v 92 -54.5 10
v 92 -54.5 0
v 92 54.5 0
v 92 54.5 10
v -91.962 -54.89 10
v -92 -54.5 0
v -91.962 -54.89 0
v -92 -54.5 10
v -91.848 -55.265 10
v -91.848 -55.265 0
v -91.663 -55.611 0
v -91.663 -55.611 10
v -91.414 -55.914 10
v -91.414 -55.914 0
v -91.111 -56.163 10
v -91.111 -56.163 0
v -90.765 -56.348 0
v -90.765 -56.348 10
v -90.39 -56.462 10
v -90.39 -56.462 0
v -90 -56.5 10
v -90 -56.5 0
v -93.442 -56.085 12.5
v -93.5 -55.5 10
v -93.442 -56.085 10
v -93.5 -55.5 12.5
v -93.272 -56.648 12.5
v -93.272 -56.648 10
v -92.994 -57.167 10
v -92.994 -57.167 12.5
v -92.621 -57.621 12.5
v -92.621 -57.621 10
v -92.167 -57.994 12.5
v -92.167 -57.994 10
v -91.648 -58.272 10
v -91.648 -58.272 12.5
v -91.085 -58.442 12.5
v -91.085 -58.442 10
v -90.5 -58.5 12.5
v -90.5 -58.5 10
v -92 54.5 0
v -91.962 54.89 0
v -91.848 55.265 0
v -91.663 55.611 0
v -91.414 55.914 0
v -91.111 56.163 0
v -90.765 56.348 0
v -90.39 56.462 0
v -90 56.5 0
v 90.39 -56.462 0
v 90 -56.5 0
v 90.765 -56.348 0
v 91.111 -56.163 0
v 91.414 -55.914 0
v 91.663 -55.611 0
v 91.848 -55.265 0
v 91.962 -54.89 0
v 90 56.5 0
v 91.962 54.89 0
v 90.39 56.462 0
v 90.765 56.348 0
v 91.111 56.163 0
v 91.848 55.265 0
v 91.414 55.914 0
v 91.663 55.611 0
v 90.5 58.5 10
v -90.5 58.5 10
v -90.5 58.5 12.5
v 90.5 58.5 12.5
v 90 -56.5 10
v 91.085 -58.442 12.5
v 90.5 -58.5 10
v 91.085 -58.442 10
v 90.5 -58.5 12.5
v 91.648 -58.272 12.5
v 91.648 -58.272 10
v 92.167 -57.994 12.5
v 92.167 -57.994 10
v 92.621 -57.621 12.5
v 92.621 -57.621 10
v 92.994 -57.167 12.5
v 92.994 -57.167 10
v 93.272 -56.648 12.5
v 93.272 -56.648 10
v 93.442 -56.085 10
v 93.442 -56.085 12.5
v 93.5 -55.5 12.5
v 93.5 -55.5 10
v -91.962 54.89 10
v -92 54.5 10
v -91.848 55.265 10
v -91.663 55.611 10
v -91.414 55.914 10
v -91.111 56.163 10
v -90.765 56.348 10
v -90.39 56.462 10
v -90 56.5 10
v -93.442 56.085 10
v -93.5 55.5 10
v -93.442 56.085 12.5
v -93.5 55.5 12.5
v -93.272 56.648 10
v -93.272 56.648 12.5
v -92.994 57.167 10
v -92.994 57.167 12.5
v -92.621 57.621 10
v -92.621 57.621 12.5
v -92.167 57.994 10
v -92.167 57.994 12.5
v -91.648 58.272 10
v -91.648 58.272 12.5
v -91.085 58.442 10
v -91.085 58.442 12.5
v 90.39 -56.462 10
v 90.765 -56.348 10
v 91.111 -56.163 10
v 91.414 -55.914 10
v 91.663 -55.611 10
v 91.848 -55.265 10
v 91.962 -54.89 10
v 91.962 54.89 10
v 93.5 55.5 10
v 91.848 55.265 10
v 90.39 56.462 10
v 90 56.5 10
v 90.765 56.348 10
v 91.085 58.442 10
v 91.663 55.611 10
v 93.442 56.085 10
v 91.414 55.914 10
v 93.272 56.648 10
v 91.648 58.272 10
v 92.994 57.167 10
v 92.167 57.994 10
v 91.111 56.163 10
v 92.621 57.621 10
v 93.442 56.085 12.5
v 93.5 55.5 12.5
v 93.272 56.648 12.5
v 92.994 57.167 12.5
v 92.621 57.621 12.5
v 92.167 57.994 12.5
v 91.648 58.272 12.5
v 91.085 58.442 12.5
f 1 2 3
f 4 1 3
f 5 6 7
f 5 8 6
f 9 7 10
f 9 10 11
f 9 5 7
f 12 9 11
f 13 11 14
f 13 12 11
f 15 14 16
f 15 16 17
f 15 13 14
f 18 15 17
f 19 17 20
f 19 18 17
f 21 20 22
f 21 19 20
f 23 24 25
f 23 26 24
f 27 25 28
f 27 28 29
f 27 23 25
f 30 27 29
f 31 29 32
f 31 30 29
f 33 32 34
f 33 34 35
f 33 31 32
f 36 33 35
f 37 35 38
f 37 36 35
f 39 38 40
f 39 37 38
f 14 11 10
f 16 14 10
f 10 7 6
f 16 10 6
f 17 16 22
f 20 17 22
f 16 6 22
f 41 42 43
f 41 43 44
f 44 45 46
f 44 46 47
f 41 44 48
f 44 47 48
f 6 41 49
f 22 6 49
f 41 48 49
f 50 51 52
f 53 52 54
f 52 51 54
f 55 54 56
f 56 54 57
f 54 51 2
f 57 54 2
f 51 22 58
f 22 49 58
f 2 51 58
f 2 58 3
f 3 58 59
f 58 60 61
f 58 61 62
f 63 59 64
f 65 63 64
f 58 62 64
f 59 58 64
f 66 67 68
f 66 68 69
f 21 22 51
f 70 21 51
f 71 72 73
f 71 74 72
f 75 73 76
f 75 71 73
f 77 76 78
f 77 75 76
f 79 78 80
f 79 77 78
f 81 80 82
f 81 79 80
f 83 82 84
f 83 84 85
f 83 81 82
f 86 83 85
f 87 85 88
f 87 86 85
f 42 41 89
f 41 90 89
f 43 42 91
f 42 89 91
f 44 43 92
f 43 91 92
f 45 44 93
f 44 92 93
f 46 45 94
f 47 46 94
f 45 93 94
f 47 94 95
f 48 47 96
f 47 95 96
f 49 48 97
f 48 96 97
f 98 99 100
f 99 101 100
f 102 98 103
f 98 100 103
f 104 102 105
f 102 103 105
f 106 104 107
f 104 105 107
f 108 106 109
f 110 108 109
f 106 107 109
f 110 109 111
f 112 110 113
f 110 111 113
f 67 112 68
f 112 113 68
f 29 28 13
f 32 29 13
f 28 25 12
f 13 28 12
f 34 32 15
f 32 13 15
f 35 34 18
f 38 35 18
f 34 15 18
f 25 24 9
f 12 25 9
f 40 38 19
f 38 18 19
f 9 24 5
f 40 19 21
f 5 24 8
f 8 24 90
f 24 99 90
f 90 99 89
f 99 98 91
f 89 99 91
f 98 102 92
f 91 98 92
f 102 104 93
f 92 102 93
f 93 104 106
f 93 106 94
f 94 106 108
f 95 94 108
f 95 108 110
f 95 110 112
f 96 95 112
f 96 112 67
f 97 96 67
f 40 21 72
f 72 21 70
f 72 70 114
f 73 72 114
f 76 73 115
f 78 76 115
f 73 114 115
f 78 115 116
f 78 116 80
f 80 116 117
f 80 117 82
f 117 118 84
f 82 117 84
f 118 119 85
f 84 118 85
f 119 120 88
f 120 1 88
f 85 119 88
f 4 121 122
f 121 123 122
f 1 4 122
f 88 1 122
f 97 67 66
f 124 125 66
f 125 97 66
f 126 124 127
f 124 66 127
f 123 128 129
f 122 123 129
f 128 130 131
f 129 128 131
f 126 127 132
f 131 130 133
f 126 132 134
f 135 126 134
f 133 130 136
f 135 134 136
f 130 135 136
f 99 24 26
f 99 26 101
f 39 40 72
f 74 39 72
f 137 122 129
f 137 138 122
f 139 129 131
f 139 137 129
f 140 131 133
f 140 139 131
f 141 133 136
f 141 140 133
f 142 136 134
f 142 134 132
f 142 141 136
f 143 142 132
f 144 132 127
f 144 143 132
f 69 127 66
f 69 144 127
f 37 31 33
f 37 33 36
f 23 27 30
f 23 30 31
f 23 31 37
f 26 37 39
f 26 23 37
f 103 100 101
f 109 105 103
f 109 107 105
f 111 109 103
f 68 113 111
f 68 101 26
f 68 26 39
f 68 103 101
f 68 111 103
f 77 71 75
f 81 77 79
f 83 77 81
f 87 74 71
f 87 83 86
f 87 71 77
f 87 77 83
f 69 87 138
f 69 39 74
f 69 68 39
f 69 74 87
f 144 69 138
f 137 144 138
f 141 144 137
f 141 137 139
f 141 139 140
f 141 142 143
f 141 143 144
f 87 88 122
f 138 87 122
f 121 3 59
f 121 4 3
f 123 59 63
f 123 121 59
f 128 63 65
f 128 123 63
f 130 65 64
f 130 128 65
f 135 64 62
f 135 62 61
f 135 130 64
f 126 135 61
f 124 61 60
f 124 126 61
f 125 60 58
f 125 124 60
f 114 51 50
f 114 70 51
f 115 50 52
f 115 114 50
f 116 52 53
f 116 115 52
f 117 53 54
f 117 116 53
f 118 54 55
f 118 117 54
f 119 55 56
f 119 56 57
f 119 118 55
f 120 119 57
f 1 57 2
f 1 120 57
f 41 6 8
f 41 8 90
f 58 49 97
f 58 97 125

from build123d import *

# Parameters (mm, degrees)
SCHIZZO1_W                   = 184
SCHIZZO1_H                   = 113
ESTRUSIONE_ESTRUSIONE1_DEPTH = 10
RACCORDO1_R                  = 2
RACCORDO2_R                  = 2
RACCORDO3_R                  = 2
RACCORDO4_R                  = 2
SCHIZZO2_W                   = 187
SCHIZZO2_H                   = 117
ESTRUSIONE_ESTRUSIONE2_DEPTH = 2.5
RACCORDO5_R                  = 3
RACCORDO6_R                  = 3
RACCORDO7_R                  = 3
RACCORDO8_R                  = 3


with BuildPart() as part:
    # Schizzo1 → Estrusione-Estrusione1 (new body)
    with BuildSketch(Plane.XY):
        Rectangle(SCHIZZO1_W, SCHIZZO1_H)
    extrude(amount=ESTRUSIONE_ESTRUSIONE1_DEPTH)

    # Raccordo1
    raccordo1_edges = [part.edges().sort_by_distance(p)[0] for p in [
        (-92, 56.5, 5),
    ]]
    fillet(raccordo1_edges, radius=RACCORDO1_R)

    # Raccordo2
    raccordo2_edges = [part.edges().sort_by_distance(p)[0] for p in [
        (-92, -56.5, 5),
    ]]
    fillet(raccordo2_edges, radius=RACCORDO2_R)

    # Raccordo3
    raccordo3_edges = [part.edges().sort_by_distance(p)[0] for p in [
        (92, -56.5, 5),
    ]]
    fillet(raccordo3_edges, radius=RACCORDO3_R)

    # Raccordo4
    raccordo4_edges = [part.edges().sort_by_distance(p)[0] for p in [
        (92, 56.5, 5),
    ]]
    fillet(raccordo4_edges, radius=RACCORDO4_R)

    # Schizzo2 → Estrusione-Estrusione2 (add)
    with BuildSketch(Plane.XY.offset(10)):
        Rectangle(SCHIZZO2_W, SCHIZZO2_H)
    extrude(amount=ESTRUSIONE_ESTRUSIONE2_DEPTH)

    # Raccordo5
    raccordo5_edges = [part.edges().sort_by_distance(p)[0] for p in [
        (-93.5, 58.5, 11.25),
    ]]
    fillet(raccordo5_edges, radius=RACCORDO5_R)

    # Raccordo6
    raccordo6_edges = [part.edges().sort_by_distance(p)[0] for p in [
        (-93.5, -58.5, 11.25),
    ]]
    fillet(raccordo6_edges, radius=RACCORDO6_R)

    # Raccordo7
    raccordo7_edges = [part.edges().sort_by_distance(p)[0] for p in [
        (93.5, -58.5, 11.25),
    ]]
    fillet(raccordo7_edges, radius=RACCORDO7_R)

    # Raccordo8
    raccordo8_edges = [part.edges().sort_by_distance(p)[0] for p in [
        (93.5, 58.5, 11.25),
    ]]
    fillet(raccordo8_edges, radius=RACCORDO8_R)


solid = part.part
